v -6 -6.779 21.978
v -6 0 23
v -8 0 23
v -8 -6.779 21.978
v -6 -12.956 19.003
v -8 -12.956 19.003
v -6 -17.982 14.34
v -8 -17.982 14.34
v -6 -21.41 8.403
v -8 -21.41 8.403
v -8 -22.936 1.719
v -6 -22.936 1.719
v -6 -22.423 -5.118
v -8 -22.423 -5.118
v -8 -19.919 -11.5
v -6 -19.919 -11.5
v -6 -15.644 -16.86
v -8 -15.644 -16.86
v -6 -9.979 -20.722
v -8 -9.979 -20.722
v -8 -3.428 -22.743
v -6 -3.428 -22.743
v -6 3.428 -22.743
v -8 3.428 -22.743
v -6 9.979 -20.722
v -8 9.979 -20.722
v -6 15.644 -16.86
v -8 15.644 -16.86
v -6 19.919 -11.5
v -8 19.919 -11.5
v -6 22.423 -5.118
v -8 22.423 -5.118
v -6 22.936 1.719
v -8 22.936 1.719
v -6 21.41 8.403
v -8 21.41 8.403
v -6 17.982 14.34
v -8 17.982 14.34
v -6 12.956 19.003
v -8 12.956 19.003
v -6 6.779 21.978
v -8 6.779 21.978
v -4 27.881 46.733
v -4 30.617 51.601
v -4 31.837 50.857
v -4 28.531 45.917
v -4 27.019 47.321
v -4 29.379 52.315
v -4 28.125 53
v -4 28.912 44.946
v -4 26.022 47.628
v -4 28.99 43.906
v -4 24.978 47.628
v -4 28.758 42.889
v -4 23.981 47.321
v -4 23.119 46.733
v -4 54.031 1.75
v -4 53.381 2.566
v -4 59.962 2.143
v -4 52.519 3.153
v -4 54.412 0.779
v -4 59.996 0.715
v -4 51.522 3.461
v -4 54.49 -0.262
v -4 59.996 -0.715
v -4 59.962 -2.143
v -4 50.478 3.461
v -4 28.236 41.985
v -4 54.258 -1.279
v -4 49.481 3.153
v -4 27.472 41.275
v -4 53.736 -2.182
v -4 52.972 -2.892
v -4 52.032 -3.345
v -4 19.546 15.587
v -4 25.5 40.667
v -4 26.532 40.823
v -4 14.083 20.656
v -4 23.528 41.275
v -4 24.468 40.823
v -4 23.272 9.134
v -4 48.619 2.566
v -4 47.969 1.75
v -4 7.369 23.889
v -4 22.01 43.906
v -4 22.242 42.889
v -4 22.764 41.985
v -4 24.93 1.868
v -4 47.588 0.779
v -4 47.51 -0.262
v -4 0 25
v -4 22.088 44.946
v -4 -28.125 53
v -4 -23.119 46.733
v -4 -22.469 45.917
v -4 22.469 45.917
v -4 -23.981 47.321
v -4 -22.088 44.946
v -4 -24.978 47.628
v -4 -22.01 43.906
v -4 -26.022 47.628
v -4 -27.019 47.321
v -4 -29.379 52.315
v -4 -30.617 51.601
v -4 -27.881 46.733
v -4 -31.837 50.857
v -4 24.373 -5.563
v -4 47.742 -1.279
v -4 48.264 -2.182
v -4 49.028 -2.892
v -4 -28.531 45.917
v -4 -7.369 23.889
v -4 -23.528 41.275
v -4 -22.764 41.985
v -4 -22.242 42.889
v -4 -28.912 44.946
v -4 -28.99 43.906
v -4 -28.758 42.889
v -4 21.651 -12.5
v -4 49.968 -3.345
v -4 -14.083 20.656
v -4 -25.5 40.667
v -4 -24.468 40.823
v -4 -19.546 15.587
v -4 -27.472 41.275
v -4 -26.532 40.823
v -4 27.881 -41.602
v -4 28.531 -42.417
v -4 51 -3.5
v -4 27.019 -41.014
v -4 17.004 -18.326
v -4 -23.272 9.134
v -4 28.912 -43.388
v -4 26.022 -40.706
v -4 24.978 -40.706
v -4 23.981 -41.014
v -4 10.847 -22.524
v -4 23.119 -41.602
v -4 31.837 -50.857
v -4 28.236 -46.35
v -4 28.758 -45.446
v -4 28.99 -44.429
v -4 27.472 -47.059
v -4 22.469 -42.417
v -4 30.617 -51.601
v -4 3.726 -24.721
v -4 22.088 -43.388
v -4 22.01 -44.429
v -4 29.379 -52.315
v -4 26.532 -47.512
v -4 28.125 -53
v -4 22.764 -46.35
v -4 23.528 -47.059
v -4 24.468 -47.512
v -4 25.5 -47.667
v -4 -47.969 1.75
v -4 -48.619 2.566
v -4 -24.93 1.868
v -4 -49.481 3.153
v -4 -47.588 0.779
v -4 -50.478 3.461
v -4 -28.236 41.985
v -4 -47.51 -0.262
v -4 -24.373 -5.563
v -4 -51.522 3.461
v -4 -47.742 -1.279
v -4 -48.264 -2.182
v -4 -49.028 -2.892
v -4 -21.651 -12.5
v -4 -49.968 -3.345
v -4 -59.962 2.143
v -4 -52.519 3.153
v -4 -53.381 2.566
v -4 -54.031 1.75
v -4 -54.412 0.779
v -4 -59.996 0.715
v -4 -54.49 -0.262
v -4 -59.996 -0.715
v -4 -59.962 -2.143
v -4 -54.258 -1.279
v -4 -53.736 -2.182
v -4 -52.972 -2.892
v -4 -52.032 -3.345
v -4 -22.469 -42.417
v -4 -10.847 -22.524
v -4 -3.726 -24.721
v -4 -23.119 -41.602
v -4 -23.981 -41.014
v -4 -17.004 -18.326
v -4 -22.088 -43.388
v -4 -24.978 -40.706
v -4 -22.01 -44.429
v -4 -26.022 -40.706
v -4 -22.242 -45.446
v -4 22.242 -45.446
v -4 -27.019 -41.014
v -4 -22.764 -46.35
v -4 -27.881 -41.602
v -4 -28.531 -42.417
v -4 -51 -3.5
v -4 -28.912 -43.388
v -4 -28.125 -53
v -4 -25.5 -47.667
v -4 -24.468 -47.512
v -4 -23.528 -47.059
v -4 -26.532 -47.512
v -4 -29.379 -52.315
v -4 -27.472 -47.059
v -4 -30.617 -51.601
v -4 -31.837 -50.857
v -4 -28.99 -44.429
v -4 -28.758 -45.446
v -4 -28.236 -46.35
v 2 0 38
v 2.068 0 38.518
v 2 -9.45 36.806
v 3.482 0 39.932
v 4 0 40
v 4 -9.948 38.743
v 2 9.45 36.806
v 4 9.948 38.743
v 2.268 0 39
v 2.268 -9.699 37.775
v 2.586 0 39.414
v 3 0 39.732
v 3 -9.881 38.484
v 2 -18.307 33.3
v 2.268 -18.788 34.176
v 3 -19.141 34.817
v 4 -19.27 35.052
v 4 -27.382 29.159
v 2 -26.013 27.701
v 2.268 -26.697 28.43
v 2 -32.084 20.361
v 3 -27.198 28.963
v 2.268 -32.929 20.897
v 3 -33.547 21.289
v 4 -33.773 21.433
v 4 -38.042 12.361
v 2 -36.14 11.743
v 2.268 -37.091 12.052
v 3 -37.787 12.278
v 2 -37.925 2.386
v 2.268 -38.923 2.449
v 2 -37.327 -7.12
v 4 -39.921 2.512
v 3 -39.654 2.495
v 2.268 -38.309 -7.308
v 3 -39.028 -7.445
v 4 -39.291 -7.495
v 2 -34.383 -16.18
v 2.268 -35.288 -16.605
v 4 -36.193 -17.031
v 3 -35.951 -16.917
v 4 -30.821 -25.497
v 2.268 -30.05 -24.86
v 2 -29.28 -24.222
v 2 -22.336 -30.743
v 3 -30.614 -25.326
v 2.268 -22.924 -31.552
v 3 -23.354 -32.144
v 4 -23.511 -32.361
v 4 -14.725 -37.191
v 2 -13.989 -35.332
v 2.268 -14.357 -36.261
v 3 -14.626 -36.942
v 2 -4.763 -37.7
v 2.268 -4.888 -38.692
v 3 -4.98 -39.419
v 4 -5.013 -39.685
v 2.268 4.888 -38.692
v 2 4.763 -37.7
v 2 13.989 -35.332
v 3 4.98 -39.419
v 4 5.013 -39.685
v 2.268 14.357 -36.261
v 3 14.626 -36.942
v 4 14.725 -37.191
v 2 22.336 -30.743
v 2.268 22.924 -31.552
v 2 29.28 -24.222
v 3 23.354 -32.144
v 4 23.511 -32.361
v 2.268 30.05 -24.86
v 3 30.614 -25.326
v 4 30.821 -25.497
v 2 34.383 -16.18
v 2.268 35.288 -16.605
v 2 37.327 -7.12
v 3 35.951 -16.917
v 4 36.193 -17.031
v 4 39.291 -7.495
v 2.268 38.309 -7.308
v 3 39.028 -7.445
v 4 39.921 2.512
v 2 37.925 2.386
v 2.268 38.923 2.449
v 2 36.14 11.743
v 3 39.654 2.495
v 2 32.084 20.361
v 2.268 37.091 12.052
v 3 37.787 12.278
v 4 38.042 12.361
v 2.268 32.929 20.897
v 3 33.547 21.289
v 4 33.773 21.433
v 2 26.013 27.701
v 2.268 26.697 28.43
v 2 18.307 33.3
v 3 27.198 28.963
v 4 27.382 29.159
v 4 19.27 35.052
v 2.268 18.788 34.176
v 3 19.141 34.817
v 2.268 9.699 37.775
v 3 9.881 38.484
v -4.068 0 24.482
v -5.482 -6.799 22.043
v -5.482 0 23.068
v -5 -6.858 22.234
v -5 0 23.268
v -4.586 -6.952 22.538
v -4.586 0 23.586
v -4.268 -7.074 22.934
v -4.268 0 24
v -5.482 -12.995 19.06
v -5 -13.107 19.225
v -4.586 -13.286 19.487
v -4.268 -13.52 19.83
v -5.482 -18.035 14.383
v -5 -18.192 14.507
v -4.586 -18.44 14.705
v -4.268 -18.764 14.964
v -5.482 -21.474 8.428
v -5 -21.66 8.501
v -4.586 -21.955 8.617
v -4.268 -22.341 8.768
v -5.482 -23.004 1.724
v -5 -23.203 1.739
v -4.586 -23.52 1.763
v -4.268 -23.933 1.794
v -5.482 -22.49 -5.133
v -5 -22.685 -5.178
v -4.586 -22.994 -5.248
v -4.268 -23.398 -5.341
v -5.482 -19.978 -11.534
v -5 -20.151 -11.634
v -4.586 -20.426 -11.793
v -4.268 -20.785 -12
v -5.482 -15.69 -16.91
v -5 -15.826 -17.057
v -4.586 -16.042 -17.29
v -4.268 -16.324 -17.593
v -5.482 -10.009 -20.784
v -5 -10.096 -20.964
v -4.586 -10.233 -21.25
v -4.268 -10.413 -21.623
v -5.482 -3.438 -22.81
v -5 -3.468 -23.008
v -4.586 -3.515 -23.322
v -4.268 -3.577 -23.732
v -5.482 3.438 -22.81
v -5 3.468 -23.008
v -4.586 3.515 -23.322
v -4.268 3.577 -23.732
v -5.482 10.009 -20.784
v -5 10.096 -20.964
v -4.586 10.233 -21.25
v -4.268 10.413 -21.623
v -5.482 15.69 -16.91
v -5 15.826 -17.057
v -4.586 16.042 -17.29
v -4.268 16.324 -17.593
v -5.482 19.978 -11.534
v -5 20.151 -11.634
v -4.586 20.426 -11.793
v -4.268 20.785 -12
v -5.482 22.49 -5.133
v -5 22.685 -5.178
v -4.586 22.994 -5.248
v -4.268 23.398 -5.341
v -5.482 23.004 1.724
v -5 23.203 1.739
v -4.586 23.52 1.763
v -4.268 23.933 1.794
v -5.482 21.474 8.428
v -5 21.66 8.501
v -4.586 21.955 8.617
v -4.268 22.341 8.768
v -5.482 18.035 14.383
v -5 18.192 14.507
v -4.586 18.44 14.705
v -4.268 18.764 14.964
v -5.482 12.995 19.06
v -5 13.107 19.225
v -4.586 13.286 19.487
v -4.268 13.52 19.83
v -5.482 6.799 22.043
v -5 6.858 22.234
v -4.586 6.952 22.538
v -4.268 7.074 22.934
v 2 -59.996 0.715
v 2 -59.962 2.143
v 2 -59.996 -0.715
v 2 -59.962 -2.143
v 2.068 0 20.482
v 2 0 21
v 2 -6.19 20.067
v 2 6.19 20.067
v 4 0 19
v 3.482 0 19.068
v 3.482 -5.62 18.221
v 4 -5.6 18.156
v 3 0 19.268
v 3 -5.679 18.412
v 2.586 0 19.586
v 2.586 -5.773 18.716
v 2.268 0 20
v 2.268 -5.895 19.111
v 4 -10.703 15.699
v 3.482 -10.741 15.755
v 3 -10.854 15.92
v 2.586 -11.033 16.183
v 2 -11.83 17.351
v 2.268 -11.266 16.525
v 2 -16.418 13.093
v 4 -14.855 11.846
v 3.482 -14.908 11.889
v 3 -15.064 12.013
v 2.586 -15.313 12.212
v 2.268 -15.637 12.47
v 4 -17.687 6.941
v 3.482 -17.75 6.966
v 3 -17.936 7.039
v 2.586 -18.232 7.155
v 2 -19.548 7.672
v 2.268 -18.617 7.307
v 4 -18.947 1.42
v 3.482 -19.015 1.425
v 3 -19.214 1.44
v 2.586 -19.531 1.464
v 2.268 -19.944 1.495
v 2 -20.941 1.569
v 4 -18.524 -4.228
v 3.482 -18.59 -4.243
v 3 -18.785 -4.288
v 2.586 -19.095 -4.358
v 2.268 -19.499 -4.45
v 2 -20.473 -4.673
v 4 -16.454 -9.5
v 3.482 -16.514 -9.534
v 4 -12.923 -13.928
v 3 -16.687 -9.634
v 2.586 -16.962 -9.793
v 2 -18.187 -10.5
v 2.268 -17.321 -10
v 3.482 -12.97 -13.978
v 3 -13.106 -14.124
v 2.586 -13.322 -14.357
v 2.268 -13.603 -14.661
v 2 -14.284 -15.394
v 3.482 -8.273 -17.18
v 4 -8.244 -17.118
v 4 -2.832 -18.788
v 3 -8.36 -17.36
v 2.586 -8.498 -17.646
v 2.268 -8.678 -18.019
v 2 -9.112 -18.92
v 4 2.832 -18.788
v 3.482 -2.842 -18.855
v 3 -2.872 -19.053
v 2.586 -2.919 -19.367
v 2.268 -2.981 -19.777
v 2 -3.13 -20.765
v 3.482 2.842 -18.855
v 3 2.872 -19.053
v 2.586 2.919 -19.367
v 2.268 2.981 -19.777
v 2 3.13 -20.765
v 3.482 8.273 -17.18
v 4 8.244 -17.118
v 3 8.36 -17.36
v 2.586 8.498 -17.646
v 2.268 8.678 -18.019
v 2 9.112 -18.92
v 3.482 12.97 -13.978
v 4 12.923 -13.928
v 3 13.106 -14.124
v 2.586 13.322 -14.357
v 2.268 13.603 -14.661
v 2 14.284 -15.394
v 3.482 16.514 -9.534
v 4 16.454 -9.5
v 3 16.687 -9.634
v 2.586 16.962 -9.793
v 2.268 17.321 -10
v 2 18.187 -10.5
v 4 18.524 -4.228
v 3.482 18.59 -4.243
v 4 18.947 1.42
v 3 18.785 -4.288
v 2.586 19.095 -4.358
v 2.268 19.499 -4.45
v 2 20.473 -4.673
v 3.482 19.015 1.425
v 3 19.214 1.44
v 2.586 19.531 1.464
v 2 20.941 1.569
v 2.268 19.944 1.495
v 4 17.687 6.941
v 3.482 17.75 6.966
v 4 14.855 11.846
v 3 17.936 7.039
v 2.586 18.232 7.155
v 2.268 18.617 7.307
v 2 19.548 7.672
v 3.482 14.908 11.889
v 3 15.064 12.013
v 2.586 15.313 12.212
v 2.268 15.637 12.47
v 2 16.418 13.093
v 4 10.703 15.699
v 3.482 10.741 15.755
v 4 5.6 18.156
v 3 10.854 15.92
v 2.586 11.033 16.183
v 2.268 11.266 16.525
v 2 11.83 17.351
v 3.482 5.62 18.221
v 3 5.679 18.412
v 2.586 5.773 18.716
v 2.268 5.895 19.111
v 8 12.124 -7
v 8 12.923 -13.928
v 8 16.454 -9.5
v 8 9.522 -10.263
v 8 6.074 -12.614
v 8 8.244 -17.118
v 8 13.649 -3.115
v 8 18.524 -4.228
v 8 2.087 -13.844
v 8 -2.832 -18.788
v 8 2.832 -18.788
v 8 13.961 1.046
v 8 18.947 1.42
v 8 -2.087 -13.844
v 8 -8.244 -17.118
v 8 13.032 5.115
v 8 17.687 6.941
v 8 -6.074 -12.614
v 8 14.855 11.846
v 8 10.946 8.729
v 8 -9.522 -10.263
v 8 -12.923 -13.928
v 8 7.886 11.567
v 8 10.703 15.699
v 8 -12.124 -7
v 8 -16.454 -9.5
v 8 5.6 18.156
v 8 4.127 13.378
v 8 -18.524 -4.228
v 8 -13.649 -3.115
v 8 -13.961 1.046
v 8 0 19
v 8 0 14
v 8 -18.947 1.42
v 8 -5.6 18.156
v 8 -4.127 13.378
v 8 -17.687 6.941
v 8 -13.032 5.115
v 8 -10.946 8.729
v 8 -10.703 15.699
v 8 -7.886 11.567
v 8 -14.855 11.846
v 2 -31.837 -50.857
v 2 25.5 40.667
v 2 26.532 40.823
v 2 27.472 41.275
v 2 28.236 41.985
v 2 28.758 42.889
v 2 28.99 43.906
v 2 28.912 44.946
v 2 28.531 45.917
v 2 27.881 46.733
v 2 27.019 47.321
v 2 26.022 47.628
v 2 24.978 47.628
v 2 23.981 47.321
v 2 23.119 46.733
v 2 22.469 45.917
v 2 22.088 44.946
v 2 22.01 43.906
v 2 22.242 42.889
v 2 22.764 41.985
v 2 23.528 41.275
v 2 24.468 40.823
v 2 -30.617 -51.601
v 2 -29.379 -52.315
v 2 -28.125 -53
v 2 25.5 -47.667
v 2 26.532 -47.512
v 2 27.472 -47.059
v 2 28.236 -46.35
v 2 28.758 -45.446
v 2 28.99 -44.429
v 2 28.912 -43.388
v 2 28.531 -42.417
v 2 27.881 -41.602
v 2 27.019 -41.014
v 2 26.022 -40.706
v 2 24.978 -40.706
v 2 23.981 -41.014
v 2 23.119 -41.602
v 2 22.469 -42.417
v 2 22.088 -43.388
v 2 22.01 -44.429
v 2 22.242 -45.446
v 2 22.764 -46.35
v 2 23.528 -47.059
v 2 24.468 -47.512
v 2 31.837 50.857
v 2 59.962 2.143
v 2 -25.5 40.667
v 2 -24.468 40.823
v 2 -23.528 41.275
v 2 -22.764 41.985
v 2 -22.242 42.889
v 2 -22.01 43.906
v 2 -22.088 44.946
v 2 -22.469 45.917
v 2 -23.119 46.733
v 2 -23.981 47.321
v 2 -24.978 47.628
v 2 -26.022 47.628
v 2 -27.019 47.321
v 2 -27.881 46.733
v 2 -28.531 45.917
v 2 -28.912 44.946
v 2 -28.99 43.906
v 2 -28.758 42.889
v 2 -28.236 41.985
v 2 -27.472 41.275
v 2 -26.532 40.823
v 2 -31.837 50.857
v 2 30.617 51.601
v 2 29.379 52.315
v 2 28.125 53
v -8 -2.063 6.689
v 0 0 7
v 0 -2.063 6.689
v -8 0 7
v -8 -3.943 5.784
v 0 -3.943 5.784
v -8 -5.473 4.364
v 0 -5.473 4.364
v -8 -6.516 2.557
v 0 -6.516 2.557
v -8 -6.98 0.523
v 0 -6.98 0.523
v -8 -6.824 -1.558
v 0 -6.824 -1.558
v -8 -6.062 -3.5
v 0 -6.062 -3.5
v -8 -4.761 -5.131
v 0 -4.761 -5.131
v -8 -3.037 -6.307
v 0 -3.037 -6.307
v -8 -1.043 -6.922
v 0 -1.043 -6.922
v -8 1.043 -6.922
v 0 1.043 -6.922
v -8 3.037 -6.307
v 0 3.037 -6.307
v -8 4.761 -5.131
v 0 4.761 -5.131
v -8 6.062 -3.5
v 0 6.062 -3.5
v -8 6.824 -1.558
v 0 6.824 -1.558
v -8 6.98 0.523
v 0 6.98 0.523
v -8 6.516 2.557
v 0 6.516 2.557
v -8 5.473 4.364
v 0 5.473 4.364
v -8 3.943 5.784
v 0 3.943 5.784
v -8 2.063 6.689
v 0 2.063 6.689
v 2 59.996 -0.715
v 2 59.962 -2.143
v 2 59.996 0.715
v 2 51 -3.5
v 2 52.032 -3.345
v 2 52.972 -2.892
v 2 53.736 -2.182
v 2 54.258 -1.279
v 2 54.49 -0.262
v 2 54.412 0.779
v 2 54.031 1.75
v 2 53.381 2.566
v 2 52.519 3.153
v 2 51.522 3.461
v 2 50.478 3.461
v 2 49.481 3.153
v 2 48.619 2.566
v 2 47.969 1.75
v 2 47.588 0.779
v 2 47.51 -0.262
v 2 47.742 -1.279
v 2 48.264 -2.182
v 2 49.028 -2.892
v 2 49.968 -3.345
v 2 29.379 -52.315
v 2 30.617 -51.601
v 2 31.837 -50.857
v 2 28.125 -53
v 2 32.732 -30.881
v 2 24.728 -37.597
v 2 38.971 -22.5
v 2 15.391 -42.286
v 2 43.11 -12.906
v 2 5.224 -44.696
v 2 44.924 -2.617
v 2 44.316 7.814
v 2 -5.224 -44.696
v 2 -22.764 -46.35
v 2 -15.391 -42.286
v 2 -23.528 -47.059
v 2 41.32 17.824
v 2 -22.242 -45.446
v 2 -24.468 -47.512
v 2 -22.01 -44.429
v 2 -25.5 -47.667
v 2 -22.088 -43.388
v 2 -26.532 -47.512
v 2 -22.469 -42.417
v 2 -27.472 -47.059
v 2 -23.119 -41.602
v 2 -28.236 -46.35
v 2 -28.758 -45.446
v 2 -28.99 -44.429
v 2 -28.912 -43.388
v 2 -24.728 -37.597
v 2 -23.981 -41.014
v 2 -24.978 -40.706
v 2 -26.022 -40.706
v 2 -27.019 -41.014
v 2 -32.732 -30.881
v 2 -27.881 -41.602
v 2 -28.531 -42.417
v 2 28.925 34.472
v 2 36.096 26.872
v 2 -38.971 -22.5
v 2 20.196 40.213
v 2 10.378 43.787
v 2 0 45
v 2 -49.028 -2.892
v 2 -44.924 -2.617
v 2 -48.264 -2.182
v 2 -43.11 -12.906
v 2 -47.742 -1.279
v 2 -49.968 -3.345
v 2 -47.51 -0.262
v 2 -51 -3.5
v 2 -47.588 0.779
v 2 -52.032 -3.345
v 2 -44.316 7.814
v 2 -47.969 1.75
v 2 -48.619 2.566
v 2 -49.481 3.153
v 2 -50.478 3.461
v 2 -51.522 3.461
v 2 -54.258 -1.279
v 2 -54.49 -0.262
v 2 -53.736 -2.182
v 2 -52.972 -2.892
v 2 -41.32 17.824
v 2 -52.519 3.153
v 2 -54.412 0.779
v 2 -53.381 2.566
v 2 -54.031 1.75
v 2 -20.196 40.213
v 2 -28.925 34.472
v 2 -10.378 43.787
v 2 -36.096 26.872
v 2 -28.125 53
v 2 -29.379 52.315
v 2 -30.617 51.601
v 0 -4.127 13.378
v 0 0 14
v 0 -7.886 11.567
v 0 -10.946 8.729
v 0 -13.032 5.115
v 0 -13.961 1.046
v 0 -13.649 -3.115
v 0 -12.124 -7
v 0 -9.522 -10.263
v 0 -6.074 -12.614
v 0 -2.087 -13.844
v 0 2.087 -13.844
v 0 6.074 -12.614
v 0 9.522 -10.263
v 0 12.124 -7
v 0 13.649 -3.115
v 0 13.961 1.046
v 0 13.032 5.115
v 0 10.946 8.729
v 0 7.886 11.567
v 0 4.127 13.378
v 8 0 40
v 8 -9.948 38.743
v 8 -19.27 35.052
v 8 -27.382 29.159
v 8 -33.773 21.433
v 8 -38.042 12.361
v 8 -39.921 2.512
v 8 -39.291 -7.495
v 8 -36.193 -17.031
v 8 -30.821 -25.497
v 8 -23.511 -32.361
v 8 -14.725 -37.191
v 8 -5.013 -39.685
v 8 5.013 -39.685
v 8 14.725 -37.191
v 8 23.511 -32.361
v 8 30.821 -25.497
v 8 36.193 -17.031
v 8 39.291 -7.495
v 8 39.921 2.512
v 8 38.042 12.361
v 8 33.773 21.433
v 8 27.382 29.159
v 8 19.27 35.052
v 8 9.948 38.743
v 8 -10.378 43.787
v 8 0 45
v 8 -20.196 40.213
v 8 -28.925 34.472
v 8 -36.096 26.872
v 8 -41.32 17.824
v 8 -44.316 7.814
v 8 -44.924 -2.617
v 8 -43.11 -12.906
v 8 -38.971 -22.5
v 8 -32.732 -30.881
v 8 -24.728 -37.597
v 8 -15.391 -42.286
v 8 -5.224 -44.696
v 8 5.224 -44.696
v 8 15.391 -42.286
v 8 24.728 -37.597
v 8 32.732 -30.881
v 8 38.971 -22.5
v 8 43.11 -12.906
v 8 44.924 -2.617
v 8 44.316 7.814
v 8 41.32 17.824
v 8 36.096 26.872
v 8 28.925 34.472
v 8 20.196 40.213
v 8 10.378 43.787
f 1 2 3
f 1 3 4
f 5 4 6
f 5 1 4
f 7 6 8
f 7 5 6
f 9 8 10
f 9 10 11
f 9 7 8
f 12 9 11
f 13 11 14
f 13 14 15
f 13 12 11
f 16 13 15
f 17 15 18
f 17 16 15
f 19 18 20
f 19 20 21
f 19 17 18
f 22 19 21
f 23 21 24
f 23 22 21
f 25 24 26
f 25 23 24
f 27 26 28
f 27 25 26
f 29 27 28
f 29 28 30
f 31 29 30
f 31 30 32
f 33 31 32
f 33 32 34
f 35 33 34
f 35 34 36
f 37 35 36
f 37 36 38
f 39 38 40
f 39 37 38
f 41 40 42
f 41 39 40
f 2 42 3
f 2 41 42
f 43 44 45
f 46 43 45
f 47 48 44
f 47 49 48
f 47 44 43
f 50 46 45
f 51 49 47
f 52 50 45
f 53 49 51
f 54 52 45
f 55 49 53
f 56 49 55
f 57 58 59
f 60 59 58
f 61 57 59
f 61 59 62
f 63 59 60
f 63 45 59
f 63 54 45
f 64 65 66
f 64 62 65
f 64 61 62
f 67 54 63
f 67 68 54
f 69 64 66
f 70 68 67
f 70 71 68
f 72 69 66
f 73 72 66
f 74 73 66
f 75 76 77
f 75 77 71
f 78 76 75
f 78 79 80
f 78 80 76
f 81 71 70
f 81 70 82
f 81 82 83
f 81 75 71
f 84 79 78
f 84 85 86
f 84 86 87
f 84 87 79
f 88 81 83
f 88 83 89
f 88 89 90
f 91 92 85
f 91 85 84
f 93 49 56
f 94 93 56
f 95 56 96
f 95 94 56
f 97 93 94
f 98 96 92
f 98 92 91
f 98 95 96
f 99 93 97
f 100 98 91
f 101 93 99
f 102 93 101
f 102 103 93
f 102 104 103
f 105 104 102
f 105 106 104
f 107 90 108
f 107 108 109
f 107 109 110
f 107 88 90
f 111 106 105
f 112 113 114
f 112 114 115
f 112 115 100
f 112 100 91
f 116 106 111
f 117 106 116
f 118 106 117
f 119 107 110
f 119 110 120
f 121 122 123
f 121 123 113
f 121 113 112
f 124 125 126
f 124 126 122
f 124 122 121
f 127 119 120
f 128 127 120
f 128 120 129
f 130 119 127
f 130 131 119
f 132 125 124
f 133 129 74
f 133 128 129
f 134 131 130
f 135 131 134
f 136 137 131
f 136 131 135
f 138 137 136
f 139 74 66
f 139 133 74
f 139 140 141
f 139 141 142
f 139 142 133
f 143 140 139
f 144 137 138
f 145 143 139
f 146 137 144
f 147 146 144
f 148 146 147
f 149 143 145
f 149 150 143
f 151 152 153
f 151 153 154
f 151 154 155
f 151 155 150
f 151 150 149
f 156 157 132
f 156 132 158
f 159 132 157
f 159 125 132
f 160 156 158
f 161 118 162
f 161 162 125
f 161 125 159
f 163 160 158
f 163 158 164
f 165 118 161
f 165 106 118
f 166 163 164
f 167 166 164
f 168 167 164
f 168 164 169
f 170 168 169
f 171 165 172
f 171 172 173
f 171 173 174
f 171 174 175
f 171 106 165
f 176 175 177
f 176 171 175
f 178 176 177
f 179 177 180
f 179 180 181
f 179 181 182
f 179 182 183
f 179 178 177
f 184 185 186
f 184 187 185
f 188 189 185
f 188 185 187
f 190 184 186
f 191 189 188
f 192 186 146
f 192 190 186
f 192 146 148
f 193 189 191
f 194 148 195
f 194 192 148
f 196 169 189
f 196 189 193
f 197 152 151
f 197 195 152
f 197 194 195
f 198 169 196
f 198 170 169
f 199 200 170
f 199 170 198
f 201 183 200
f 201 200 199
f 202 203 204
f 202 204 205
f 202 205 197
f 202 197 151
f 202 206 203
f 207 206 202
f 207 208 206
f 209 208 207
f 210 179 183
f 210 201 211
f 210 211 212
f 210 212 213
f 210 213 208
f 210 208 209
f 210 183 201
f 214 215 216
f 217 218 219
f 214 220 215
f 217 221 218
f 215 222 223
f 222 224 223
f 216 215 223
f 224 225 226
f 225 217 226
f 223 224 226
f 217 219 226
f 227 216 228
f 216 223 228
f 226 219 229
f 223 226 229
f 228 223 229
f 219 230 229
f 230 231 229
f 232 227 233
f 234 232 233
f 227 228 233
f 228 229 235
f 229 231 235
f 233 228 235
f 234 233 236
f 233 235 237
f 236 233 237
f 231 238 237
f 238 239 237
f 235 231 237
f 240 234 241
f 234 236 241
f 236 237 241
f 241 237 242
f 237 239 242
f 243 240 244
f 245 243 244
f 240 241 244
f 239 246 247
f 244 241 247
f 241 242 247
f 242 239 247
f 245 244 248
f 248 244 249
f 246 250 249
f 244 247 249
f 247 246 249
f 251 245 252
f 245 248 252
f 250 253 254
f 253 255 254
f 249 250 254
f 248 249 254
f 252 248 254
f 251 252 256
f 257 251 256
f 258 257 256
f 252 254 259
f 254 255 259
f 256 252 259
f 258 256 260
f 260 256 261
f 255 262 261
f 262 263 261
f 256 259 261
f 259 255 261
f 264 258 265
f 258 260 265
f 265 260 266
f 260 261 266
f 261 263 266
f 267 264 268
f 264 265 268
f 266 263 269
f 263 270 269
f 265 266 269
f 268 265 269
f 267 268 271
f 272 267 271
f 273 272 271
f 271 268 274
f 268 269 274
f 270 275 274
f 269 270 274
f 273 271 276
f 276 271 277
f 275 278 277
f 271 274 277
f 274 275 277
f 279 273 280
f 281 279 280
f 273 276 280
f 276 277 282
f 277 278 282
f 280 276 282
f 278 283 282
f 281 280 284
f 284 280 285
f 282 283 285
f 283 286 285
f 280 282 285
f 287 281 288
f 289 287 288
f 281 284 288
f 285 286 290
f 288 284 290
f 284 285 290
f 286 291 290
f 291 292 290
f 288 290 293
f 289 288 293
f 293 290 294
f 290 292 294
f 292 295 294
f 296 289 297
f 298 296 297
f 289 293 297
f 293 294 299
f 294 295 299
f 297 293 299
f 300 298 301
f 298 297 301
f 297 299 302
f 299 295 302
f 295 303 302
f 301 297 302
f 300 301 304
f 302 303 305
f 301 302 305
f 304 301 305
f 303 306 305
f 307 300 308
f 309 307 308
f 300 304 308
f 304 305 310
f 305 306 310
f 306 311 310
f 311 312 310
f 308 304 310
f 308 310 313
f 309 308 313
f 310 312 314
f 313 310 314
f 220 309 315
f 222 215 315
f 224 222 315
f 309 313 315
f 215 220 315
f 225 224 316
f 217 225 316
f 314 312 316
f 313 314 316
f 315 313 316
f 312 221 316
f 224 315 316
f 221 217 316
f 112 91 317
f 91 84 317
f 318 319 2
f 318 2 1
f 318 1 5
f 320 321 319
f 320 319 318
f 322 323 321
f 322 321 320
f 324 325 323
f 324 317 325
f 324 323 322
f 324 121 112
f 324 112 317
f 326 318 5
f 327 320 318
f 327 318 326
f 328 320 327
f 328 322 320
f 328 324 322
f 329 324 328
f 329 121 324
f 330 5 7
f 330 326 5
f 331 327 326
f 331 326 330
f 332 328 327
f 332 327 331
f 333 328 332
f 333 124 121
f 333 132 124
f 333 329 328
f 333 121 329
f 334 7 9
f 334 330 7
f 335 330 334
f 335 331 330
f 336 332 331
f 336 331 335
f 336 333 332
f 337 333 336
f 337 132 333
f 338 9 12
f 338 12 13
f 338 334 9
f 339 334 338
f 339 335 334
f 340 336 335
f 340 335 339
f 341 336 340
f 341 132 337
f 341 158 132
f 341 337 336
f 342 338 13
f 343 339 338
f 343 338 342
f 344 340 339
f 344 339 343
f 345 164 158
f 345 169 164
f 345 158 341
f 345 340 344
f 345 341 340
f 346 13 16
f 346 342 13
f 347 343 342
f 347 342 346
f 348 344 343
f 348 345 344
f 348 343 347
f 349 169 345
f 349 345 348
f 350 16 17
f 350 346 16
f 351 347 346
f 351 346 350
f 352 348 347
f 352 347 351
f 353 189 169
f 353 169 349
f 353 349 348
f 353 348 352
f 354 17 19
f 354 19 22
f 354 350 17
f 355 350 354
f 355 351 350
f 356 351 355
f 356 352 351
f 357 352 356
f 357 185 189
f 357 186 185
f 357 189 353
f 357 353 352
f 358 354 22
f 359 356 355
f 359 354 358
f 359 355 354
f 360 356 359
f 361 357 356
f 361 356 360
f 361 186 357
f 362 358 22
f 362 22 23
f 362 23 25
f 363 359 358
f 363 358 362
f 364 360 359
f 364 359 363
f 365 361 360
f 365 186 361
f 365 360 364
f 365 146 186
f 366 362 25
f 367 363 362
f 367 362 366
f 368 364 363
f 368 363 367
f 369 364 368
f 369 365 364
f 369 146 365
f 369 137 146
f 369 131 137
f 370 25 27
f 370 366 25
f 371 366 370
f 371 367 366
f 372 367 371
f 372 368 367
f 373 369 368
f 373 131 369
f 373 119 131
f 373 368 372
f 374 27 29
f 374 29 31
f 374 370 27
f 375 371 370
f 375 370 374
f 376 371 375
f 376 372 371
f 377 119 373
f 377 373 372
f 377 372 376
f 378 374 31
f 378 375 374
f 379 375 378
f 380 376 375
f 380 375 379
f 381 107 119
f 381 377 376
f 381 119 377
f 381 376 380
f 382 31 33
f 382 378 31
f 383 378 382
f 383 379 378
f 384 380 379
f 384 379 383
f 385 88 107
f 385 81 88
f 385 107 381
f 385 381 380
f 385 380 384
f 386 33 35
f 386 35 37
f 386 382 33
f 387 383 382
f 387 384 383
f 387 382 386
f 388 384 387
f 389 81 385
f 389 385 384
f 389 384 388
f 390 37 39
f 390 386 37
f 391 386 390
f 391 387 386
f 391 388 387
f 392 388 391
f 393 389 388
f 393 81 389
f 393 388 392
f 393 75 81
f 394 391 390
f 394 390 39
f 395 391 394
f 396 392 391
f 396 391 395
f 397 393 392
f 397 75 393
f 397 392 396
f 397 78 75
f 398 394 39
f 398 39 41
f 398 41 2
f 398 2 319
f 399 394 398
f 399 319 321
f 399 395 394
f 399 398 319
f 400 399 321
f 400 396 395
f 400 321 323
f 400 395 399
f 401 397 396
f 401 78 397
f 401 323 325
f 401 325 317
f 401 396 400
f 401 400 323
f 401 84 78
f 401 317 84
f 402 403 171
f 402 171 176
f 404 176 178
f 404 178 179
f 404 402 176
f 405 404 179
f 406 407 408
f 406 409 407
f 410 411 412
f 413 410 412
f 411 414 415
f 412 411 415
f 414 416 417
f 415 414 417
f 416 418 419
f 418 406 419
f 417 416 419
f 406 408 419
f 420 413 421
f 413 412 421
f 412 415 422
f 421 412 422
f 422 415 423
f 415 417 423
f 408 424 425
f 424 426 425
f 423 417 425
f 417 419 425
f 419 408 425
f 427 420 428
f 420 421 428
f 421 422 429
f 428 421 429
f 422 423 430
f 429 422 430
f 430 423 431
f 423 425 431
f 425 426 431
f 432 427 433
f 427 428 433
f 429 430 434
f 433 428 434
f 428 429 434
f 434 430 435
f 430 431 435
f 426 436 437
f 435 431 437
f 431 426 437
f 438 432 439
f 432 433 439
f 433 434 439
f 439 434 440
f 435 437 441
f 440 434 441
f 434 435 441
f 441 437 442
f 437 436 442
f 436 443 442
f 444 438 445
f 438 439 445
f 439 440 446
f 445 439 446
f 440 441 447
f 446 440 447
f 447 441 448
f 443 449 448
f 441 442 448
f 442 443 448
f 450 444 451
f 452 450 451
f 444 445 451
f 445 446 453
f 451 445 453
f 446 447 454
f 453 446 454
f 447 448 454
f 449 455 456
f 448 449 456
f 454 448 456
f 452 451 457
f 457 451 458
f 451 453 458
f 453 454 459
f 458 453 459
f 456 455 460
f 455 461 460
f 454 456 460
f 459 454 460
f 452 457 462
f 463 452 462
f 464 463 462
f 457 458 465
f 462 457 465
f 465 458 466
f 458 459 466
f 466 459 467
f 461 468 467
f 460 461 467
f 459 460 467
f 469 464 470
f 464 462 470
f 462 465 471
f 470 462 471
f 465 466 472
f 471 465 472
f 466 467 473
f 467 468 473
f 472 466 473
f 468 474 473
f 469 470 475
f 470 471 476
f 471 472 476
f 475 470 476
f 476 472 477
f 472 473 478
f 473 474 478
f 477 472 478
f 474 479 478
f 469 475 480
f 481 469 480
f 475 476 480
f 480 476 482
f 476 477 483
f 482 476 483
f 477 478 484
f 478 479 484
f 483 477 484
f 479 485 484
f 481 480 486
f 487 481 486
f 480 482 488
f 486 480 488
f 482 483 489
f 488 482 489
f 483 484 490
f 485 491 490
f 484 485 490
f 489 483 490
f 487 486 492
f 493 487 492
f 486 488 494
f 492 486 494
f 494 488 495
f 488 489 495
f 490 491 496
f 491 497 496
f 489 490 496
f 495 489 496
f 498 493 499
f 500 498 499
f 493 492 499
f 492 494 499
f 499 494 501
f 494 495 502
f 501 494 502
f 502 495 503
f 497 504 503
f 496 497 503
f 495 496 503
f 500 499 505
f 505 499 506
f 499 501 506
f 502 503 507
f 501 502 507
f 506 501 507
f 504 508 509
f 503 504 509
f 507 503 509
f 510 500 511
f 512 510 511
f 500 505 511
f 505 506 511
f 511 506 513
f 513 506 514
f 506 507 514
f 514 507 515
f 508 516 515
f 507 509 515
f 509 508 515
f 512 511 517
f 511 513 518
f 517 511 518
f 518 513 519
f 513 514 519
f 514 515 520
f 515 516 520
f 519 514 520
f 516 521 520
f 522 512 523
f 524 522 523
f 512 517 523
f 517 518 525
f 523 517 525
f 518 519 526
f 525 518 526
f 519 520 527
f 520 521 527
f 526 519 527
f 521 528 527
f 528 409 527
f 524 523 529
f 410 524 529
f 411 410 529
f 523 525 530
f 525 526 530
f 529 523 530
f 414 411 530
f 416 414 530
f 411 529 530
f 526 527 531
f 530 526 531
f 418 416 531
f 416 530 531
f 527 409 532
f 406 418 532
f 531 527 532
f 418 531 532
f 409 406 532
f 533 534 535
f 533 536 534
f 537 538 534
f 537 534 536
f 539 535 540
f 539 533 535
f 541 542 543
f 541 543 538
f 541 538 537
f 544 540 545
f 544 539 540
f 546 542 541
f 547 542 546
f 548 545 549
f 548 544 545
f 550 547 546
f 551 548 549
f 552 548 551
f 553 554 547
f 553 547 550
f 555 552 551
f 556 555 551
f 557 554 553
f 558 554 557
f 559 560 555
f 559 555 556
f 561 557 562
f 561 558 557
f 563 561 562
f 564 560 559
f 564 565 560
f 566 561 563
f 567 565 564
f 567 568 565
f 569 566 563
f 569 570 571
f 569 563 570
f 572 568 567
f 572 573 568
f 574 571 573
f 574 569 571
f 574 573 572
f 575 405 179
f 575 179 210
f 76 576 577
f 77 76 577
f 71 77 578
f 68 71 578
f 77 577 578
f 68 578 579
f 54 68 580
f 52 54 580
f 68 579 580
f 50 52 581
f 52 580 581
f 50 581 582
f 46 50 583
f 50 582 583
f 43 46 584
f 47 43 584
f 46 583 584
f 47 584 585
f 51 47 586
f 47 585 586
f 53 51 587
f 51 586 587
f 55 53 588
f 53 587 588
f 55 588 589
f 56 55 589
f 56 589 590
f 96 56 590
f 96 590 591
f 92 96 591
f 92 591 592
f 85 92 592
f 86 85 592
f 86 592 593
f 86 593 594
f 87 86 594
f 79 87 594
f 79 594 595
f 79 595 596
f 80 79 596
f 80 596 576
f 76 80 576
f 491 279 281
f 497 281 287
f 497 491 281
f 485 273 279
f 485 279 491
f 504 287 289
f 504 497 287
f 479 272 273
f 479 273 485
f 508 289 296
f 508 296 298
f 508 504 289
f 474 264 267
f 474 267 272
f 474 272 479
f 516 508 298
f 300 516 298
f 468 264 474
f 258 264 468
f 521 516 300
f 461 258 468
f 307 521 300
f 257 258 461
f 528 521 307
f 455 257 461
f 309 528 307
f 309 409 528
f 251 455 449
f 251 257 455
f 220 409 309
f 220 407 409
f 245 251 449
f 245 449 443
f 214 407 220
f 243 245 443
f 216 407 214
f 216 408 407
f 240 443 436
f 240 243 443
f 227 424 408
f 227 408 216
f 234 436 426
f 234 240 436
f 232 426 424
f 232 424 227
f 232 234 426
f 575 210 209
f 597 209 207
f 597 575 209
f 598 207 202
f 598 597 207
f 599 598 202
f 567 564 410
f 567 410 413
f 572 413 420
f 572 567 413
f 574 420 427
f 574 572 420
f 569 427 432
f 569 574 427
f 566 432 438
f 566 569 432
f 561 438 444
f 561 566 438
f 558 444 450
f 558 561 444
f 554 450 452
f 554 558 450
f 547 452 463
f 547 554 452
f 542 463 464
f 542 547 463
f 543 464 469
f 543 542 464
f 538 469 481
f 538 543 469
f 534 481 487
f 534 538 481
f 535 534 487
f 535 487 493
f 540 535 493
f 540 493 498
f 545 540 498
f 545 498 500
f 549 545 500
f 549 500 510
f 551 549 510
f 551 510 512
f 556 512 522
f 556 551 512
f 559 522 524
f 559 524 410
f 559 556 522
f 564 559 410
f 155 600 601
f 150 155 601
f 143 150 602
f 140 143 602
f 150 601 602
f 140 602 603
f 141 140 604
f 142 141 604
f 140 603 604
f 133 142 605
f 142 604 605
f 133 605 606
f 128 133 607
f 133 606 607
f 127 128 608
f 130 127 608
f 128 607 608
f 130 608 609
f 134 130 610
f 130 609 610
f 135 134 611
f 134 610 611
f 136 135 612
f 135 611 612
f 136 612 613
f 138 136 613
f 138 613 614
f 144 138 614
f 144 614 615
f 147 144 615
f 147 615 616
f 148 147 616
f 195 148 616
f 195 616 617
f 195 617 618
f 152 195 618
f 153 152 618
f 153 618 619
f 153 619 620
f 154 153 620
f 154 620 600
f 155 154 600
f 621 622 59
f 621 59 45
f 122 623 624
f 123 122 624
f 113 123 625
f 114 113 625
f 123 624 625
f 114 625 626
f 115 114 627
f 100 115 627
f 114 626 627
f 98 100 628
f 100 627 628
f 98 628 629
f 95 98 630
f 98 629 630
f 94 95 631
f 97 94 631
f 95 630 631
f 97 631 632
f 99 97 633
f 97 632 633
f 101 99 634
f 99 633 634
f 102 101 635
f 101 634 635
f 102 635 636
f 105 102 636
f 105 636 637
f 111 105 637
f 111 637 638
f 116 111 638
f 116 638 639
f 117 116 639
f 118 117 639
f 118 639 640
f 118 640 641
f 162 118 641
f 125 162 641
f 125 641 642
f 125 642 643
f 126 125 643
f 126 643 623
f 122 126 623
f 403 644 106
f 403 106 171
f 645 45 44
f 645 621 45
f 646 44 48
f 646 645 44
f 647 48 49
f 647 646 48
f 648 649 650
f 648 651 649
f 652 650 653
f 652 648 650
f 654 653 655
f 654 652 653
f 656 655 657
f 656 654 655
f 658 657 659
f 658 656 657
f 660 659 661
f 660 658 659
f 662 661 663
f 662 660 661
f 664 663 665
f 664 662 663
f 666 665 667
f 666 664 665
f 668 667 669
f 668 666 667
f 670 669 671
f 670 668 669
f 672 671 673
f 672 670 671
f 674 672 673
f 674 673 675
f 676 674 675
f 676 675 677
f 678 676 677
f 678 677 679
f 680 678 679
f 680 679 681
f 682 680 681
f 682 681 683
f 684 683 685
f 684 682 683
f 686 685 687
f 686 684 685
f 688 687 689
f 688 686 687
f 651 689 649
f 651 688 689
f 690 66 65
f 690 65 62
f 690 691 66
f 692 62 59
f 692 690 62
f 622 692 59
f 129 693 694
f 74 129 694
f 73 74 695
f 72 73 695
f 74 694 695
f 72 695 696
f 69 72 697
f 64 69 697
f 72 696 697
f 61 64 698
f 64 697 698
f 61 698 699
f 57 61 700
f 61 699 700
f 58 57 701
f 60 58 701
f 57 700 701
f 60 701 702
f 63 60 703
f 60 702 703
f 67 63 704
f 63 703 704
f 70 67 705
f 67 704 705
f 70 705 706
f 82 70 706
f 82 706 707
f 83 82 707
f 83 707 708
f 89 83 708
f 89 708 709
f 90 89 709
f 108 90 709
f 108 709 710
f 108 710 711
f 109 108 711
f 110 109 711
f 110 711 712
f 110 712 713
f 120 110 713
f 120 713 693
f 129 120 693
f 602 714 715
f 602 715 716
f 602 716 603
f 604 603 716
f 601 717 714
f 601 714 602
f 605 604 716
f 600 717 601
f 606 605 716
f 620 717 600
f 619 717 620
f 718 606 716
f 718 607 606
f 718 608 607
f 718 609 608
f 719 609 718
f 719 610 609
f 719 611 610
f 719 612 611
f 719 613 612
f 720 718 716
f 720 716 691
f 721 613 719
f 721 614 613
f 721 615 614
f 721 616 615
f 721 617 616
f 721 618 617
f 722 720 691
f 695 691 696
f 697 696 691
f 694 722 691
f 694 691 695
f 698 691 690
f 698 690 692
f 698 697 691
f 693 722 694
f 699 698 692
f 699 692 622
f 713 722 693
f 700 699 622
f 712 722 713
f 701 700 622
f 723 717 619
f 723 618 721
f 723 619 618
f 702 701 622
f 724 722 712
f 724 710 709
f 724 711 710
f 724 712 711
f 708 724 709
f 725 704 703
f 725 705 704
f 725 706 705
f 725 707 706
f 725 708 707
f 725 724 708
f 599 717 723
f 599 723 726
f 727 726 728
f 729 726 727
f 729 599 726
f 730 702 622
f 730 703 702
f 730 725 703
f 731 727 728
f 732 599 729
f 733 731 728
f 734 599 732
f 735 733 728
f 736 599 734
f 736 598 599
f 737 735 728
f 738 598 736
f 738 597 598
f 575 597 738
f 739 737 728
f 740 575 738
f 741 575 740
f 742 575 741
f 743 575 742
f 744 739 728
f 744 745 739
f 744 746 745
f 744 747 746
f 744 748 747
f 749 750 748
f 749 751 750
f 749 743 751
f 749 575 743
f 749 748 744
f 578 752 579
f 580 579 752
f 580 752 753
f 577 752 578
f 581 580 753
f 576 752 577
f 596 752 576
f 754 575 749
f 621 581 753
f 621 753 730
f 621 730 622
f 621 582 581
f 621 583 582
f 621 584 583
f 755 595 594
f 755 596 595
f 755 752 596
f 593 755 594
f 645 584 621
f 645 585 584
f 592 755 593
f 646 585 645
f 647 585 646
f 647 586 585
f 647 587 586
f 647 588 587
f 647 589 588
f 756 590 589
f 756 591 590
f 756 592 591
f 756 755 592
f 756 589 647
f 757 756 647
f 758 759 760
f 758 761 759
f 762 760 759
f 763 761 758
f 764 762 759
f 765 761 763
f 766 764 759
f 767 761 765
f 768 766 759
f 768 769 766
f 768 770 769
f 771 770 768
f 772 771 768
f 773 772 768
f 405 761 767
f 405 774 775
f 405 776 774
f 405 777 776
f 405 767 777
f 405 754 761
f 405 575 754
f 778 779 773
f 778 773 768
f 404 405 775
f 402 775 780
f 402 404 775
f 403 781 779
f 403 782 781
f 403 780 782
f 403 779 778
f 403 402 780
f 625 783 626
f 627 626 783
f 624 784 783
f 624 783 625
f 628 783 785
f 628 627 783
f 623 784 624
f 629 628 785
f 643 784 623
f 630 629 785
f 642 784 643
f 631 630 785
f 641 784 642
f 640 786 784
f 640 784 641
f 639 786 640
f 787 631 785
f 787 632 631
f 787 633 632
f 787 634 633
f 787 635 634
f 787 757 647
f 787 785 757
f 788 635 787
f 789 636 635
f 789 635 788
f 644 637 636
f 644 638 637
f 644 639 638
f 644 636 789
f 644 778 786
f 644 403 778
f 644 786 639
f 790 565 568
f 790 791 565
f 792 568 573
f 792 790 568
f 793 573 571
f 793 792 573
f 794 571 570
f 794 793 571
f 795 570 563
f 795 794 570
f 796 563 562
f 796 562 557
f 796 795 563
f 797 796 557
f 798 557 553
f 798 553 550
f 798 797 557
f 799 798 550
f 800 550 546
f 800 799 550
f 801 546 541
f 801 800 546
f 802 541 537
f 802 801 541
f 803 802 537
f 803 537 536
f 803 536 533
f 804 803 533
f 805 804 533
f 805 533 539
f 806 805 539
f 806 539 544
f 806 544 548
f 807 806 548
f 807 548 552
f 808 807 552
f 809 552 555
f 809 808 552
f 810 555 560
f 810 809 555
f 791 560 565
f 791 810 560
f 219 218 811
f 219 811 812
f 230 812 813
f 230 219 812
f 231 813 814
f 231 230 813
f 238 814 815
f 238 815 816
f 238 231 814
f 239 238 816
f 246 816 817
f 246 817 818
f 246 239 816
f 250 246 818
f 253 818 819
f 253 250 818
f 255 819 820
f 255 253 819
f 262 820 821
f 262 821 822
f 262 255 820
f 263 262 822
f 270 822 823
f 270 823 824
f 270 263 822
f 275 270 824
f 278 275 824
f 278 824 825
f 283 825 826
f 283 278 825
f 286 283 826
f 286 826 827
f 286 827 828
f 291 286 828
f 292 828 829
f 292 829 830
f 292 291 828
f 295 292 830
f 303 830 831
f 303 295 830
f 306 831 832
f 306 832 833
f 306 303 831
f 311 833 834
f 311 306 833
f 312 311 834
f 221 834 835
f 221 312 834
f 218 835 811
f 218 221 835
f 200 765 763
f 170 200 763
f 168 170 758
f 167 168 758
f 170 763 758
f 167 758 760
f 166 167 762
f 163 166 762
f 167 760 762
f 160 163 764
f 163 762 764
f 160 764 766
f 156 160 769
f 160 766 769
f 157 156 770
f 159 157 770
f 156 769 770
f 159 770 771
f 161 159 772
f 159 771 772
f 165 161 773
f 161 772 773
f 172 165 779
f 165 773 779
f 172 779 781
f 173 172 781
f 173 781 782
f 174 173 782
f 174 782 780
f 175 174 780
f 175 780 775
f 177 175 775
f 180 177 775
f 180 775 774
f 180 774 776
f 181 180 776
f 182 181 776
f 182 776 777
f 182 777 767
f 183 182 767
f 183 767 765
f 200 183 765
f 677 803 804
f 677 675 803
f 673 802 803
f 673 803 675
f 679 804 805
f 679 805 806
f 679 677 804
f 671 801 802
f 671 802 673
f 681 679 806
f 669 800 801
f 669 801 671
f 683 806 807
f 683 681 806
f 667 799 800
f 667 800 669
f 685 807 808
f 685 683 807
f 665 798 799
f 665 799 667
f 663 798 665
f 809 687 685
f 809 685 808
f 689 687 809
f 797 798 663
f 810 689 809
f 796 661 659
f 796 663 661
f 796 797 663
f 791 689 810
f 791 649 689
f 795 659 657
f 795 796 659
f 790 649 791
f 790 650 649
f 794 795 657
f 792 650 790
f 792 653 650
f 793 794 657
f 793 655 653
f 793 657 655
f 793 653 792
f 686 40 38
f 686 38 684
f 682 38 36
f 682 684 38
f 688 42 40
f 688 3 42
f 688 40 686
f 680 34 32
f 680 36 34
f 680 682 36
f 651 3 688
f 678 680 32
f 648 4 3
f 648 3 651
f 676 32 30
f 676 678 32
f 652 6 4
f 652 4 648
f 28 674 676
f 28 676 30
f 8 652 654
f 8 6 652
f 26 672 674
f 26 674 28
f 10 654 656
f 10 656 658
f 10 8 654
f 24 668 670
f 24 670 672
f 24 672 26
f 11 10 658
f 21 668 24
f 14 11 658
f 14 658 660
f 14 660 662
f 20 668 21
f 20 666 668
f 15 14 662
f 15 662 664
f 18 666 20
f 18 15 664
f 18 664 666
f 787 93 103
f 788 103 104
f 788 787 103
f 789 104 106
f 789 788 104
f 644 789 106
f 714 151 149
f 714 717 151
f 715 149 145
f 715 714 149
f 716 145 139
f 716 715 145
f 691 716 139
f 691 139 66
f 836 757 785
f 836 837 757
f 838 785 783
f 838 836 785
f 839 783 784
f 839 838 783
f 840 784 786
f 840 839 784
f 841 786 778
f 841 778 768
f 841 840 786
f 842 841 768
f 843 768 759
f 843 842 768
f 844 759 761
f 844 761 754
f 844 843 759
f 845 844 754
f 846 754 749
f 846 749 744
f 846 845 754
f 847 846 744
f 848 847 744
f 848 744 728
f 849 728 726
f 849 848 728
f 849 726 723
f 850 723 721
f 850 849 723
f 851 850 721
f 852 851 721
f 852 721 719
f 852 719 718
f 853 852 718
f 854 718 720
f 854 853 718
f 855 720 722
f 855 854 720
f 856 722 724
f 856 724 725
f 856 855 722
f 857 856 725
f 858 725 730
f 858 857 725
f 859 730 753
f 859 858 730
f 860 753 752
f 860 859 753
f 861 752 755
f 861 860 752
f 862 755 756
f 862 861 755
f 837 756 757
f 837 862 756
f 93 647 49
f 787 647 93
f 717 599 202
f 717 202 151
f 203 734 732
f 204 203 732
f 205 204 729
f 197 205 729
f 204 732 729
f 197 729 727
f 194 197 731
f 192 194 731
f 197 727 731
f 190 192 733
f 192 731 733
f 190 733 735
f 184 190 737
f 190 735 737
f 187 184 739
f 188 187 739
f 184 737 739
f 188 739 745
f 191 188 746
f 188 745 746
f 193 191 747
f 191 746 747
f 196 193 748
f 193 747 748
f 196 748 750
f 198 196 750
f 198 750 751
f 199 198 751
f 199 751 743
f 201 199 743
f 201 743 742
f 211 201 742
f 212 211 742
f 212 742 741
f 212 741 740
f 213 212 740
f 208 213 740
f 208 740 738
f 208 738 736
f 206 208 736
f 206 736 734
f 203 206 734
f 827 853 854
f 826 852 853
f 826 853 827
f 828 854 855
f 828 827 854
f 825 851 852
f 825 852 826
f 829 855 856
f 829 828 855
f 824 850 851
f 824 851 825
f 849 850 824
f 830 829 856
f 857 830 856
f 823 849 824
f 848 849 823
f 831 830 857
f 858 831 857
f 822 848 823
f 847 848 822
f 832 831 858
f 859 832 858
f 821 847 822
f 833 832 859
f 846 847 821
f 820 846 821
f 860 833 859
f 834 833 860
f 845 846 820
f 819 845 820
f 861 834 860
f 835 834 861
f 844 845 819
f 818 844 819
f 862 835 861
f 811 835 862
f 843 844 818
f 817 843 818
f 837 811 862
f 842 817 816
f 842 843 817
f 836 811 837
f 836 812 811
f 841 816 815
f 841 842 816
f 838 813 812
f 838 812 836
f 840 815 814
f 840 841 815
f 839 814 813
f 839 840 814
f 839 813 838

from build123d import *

# Parameters (mm, degrees)
SKETCH2_R          = 3.5
CUT_EXTRUDE1_DEPTH = 10
FILLET1_R          = 2
CUT_EXTRUDE2_START = -10
CUT_EXTRUDE2_DEPTH = 10


with BuildPart() as part:
    # Sketch1 → Revolve1 (revolve)
    with BuildSketch(Plane.XY, mode=Mode.PRIVATE) as revolve1_sk:
        Polygon((-8, 7), (-8, 23), (-4, 23), (-4, 60), (2, 60), (2, 45), (8, 45), (8, 40), (2, 40), (2, 19), (8, 19), (8, 14), (0, 14), (0, 7), align=None)
    revolve(revolve1_sk.sketch.rotate(Axis((0, 0, 0), (1, 0, 0)), 90), axis=Axis((0, 0, 0), (1, 0, 0)))

    # Sketch2 → Cut-Extrude1 (cut)
    with BuildSketch(Plane(origin=(2, 0, 0), x_dir=(0, 0, -1), z_dir=(1, 0, 0))):
        with Locations((0, 51)):
            Circle(SKETCH2_R)
        with Locations((44.167295593, 25.5)):
            Circle(SKETCH2_R)
        with Locations((44.167295593, -25.5)):
            Circle(SKETCH2_R)
        with Locations((0, -51)):
            Circle(SKETCH2_R)
        with Locations((-44.167295593, -25.5)):
            Circle(SKETCH2_R)
        with Locations((-44.167295593, 25.5)):
            Circle(SKETCH2_R)
    extrude(amount=-CUT_EXTRUDE1_DEPTH, mode=Mode.SUBTRACT)

    # Fillet1
    fillet1_edges = [part.edges().sort_by_distance(p)[0] for p in [
        (2, 0, -19),
        (2, 0, -40),
        (-4, 0, -23),
    ]]
    fillet(fillet1_edges, radius=FILLET1_R)

    # Sketch3 → Cut-Extrude2 (cut)
    with BuildSketch(Plane.ZY.offset(4).offset(CUT_EXTRUDE2_START)):
        with BuildLine():
            ThreePointArc((-2.143276082, 59.961707511), (-30, 51.961524227), (-50.856723918, 31.83698529))
            Line((-50.856723918, 31.83698529), (-2.143276082, 59.961707511))
        make_face()
        with BuildLine():
            ThreePointArc((50.856723918, 31.83698529), (30, 51.961524227), (2.143276082, 59.961707511))
            Line((2.143276082, 59.961707511), (50.856723918, 31.83698529))
        make_face()
        with BuildLine():
            ThreePointArc((60, 0), (58.223706512, 14.491376746), (53, 28.124722221))
            Line((53, 28.124722221), (53, -28.124722221))
            ThreePointArc((53, -28.124722221), (58.223706512, -14.491376746), (60, 0))
        make_face()
        with BuildLine():
            Line((50.856723918, -31.83698529), (2.143276082, -59.961707511))
            ThreePointArc((2.143276082, -59.961707511), (30, -51.961524227), (50.856723918, -31.83698529))
        make_face()
        with BuildLine():
            Line((-2.143276082, -59.961707511), (-50.856723918, -31.83698529))
            ThreePointArc((-50.856723918, -31.83698529), (-30, -51.961524227), (-2.143276082, -59.961707511))
        make_face()
        with BuildLine():
            Line((-53, -28.124722221), (-53, 28.124722221))
            ThreePointArc((-53, 28.124722221), (-60, 0), (-53, -28.124722221))
        make_face()
    extrude(amount=CUT_EXTRUDE2_DEPTH, mode=Mode.SUBTRACT)


solid = part.part
